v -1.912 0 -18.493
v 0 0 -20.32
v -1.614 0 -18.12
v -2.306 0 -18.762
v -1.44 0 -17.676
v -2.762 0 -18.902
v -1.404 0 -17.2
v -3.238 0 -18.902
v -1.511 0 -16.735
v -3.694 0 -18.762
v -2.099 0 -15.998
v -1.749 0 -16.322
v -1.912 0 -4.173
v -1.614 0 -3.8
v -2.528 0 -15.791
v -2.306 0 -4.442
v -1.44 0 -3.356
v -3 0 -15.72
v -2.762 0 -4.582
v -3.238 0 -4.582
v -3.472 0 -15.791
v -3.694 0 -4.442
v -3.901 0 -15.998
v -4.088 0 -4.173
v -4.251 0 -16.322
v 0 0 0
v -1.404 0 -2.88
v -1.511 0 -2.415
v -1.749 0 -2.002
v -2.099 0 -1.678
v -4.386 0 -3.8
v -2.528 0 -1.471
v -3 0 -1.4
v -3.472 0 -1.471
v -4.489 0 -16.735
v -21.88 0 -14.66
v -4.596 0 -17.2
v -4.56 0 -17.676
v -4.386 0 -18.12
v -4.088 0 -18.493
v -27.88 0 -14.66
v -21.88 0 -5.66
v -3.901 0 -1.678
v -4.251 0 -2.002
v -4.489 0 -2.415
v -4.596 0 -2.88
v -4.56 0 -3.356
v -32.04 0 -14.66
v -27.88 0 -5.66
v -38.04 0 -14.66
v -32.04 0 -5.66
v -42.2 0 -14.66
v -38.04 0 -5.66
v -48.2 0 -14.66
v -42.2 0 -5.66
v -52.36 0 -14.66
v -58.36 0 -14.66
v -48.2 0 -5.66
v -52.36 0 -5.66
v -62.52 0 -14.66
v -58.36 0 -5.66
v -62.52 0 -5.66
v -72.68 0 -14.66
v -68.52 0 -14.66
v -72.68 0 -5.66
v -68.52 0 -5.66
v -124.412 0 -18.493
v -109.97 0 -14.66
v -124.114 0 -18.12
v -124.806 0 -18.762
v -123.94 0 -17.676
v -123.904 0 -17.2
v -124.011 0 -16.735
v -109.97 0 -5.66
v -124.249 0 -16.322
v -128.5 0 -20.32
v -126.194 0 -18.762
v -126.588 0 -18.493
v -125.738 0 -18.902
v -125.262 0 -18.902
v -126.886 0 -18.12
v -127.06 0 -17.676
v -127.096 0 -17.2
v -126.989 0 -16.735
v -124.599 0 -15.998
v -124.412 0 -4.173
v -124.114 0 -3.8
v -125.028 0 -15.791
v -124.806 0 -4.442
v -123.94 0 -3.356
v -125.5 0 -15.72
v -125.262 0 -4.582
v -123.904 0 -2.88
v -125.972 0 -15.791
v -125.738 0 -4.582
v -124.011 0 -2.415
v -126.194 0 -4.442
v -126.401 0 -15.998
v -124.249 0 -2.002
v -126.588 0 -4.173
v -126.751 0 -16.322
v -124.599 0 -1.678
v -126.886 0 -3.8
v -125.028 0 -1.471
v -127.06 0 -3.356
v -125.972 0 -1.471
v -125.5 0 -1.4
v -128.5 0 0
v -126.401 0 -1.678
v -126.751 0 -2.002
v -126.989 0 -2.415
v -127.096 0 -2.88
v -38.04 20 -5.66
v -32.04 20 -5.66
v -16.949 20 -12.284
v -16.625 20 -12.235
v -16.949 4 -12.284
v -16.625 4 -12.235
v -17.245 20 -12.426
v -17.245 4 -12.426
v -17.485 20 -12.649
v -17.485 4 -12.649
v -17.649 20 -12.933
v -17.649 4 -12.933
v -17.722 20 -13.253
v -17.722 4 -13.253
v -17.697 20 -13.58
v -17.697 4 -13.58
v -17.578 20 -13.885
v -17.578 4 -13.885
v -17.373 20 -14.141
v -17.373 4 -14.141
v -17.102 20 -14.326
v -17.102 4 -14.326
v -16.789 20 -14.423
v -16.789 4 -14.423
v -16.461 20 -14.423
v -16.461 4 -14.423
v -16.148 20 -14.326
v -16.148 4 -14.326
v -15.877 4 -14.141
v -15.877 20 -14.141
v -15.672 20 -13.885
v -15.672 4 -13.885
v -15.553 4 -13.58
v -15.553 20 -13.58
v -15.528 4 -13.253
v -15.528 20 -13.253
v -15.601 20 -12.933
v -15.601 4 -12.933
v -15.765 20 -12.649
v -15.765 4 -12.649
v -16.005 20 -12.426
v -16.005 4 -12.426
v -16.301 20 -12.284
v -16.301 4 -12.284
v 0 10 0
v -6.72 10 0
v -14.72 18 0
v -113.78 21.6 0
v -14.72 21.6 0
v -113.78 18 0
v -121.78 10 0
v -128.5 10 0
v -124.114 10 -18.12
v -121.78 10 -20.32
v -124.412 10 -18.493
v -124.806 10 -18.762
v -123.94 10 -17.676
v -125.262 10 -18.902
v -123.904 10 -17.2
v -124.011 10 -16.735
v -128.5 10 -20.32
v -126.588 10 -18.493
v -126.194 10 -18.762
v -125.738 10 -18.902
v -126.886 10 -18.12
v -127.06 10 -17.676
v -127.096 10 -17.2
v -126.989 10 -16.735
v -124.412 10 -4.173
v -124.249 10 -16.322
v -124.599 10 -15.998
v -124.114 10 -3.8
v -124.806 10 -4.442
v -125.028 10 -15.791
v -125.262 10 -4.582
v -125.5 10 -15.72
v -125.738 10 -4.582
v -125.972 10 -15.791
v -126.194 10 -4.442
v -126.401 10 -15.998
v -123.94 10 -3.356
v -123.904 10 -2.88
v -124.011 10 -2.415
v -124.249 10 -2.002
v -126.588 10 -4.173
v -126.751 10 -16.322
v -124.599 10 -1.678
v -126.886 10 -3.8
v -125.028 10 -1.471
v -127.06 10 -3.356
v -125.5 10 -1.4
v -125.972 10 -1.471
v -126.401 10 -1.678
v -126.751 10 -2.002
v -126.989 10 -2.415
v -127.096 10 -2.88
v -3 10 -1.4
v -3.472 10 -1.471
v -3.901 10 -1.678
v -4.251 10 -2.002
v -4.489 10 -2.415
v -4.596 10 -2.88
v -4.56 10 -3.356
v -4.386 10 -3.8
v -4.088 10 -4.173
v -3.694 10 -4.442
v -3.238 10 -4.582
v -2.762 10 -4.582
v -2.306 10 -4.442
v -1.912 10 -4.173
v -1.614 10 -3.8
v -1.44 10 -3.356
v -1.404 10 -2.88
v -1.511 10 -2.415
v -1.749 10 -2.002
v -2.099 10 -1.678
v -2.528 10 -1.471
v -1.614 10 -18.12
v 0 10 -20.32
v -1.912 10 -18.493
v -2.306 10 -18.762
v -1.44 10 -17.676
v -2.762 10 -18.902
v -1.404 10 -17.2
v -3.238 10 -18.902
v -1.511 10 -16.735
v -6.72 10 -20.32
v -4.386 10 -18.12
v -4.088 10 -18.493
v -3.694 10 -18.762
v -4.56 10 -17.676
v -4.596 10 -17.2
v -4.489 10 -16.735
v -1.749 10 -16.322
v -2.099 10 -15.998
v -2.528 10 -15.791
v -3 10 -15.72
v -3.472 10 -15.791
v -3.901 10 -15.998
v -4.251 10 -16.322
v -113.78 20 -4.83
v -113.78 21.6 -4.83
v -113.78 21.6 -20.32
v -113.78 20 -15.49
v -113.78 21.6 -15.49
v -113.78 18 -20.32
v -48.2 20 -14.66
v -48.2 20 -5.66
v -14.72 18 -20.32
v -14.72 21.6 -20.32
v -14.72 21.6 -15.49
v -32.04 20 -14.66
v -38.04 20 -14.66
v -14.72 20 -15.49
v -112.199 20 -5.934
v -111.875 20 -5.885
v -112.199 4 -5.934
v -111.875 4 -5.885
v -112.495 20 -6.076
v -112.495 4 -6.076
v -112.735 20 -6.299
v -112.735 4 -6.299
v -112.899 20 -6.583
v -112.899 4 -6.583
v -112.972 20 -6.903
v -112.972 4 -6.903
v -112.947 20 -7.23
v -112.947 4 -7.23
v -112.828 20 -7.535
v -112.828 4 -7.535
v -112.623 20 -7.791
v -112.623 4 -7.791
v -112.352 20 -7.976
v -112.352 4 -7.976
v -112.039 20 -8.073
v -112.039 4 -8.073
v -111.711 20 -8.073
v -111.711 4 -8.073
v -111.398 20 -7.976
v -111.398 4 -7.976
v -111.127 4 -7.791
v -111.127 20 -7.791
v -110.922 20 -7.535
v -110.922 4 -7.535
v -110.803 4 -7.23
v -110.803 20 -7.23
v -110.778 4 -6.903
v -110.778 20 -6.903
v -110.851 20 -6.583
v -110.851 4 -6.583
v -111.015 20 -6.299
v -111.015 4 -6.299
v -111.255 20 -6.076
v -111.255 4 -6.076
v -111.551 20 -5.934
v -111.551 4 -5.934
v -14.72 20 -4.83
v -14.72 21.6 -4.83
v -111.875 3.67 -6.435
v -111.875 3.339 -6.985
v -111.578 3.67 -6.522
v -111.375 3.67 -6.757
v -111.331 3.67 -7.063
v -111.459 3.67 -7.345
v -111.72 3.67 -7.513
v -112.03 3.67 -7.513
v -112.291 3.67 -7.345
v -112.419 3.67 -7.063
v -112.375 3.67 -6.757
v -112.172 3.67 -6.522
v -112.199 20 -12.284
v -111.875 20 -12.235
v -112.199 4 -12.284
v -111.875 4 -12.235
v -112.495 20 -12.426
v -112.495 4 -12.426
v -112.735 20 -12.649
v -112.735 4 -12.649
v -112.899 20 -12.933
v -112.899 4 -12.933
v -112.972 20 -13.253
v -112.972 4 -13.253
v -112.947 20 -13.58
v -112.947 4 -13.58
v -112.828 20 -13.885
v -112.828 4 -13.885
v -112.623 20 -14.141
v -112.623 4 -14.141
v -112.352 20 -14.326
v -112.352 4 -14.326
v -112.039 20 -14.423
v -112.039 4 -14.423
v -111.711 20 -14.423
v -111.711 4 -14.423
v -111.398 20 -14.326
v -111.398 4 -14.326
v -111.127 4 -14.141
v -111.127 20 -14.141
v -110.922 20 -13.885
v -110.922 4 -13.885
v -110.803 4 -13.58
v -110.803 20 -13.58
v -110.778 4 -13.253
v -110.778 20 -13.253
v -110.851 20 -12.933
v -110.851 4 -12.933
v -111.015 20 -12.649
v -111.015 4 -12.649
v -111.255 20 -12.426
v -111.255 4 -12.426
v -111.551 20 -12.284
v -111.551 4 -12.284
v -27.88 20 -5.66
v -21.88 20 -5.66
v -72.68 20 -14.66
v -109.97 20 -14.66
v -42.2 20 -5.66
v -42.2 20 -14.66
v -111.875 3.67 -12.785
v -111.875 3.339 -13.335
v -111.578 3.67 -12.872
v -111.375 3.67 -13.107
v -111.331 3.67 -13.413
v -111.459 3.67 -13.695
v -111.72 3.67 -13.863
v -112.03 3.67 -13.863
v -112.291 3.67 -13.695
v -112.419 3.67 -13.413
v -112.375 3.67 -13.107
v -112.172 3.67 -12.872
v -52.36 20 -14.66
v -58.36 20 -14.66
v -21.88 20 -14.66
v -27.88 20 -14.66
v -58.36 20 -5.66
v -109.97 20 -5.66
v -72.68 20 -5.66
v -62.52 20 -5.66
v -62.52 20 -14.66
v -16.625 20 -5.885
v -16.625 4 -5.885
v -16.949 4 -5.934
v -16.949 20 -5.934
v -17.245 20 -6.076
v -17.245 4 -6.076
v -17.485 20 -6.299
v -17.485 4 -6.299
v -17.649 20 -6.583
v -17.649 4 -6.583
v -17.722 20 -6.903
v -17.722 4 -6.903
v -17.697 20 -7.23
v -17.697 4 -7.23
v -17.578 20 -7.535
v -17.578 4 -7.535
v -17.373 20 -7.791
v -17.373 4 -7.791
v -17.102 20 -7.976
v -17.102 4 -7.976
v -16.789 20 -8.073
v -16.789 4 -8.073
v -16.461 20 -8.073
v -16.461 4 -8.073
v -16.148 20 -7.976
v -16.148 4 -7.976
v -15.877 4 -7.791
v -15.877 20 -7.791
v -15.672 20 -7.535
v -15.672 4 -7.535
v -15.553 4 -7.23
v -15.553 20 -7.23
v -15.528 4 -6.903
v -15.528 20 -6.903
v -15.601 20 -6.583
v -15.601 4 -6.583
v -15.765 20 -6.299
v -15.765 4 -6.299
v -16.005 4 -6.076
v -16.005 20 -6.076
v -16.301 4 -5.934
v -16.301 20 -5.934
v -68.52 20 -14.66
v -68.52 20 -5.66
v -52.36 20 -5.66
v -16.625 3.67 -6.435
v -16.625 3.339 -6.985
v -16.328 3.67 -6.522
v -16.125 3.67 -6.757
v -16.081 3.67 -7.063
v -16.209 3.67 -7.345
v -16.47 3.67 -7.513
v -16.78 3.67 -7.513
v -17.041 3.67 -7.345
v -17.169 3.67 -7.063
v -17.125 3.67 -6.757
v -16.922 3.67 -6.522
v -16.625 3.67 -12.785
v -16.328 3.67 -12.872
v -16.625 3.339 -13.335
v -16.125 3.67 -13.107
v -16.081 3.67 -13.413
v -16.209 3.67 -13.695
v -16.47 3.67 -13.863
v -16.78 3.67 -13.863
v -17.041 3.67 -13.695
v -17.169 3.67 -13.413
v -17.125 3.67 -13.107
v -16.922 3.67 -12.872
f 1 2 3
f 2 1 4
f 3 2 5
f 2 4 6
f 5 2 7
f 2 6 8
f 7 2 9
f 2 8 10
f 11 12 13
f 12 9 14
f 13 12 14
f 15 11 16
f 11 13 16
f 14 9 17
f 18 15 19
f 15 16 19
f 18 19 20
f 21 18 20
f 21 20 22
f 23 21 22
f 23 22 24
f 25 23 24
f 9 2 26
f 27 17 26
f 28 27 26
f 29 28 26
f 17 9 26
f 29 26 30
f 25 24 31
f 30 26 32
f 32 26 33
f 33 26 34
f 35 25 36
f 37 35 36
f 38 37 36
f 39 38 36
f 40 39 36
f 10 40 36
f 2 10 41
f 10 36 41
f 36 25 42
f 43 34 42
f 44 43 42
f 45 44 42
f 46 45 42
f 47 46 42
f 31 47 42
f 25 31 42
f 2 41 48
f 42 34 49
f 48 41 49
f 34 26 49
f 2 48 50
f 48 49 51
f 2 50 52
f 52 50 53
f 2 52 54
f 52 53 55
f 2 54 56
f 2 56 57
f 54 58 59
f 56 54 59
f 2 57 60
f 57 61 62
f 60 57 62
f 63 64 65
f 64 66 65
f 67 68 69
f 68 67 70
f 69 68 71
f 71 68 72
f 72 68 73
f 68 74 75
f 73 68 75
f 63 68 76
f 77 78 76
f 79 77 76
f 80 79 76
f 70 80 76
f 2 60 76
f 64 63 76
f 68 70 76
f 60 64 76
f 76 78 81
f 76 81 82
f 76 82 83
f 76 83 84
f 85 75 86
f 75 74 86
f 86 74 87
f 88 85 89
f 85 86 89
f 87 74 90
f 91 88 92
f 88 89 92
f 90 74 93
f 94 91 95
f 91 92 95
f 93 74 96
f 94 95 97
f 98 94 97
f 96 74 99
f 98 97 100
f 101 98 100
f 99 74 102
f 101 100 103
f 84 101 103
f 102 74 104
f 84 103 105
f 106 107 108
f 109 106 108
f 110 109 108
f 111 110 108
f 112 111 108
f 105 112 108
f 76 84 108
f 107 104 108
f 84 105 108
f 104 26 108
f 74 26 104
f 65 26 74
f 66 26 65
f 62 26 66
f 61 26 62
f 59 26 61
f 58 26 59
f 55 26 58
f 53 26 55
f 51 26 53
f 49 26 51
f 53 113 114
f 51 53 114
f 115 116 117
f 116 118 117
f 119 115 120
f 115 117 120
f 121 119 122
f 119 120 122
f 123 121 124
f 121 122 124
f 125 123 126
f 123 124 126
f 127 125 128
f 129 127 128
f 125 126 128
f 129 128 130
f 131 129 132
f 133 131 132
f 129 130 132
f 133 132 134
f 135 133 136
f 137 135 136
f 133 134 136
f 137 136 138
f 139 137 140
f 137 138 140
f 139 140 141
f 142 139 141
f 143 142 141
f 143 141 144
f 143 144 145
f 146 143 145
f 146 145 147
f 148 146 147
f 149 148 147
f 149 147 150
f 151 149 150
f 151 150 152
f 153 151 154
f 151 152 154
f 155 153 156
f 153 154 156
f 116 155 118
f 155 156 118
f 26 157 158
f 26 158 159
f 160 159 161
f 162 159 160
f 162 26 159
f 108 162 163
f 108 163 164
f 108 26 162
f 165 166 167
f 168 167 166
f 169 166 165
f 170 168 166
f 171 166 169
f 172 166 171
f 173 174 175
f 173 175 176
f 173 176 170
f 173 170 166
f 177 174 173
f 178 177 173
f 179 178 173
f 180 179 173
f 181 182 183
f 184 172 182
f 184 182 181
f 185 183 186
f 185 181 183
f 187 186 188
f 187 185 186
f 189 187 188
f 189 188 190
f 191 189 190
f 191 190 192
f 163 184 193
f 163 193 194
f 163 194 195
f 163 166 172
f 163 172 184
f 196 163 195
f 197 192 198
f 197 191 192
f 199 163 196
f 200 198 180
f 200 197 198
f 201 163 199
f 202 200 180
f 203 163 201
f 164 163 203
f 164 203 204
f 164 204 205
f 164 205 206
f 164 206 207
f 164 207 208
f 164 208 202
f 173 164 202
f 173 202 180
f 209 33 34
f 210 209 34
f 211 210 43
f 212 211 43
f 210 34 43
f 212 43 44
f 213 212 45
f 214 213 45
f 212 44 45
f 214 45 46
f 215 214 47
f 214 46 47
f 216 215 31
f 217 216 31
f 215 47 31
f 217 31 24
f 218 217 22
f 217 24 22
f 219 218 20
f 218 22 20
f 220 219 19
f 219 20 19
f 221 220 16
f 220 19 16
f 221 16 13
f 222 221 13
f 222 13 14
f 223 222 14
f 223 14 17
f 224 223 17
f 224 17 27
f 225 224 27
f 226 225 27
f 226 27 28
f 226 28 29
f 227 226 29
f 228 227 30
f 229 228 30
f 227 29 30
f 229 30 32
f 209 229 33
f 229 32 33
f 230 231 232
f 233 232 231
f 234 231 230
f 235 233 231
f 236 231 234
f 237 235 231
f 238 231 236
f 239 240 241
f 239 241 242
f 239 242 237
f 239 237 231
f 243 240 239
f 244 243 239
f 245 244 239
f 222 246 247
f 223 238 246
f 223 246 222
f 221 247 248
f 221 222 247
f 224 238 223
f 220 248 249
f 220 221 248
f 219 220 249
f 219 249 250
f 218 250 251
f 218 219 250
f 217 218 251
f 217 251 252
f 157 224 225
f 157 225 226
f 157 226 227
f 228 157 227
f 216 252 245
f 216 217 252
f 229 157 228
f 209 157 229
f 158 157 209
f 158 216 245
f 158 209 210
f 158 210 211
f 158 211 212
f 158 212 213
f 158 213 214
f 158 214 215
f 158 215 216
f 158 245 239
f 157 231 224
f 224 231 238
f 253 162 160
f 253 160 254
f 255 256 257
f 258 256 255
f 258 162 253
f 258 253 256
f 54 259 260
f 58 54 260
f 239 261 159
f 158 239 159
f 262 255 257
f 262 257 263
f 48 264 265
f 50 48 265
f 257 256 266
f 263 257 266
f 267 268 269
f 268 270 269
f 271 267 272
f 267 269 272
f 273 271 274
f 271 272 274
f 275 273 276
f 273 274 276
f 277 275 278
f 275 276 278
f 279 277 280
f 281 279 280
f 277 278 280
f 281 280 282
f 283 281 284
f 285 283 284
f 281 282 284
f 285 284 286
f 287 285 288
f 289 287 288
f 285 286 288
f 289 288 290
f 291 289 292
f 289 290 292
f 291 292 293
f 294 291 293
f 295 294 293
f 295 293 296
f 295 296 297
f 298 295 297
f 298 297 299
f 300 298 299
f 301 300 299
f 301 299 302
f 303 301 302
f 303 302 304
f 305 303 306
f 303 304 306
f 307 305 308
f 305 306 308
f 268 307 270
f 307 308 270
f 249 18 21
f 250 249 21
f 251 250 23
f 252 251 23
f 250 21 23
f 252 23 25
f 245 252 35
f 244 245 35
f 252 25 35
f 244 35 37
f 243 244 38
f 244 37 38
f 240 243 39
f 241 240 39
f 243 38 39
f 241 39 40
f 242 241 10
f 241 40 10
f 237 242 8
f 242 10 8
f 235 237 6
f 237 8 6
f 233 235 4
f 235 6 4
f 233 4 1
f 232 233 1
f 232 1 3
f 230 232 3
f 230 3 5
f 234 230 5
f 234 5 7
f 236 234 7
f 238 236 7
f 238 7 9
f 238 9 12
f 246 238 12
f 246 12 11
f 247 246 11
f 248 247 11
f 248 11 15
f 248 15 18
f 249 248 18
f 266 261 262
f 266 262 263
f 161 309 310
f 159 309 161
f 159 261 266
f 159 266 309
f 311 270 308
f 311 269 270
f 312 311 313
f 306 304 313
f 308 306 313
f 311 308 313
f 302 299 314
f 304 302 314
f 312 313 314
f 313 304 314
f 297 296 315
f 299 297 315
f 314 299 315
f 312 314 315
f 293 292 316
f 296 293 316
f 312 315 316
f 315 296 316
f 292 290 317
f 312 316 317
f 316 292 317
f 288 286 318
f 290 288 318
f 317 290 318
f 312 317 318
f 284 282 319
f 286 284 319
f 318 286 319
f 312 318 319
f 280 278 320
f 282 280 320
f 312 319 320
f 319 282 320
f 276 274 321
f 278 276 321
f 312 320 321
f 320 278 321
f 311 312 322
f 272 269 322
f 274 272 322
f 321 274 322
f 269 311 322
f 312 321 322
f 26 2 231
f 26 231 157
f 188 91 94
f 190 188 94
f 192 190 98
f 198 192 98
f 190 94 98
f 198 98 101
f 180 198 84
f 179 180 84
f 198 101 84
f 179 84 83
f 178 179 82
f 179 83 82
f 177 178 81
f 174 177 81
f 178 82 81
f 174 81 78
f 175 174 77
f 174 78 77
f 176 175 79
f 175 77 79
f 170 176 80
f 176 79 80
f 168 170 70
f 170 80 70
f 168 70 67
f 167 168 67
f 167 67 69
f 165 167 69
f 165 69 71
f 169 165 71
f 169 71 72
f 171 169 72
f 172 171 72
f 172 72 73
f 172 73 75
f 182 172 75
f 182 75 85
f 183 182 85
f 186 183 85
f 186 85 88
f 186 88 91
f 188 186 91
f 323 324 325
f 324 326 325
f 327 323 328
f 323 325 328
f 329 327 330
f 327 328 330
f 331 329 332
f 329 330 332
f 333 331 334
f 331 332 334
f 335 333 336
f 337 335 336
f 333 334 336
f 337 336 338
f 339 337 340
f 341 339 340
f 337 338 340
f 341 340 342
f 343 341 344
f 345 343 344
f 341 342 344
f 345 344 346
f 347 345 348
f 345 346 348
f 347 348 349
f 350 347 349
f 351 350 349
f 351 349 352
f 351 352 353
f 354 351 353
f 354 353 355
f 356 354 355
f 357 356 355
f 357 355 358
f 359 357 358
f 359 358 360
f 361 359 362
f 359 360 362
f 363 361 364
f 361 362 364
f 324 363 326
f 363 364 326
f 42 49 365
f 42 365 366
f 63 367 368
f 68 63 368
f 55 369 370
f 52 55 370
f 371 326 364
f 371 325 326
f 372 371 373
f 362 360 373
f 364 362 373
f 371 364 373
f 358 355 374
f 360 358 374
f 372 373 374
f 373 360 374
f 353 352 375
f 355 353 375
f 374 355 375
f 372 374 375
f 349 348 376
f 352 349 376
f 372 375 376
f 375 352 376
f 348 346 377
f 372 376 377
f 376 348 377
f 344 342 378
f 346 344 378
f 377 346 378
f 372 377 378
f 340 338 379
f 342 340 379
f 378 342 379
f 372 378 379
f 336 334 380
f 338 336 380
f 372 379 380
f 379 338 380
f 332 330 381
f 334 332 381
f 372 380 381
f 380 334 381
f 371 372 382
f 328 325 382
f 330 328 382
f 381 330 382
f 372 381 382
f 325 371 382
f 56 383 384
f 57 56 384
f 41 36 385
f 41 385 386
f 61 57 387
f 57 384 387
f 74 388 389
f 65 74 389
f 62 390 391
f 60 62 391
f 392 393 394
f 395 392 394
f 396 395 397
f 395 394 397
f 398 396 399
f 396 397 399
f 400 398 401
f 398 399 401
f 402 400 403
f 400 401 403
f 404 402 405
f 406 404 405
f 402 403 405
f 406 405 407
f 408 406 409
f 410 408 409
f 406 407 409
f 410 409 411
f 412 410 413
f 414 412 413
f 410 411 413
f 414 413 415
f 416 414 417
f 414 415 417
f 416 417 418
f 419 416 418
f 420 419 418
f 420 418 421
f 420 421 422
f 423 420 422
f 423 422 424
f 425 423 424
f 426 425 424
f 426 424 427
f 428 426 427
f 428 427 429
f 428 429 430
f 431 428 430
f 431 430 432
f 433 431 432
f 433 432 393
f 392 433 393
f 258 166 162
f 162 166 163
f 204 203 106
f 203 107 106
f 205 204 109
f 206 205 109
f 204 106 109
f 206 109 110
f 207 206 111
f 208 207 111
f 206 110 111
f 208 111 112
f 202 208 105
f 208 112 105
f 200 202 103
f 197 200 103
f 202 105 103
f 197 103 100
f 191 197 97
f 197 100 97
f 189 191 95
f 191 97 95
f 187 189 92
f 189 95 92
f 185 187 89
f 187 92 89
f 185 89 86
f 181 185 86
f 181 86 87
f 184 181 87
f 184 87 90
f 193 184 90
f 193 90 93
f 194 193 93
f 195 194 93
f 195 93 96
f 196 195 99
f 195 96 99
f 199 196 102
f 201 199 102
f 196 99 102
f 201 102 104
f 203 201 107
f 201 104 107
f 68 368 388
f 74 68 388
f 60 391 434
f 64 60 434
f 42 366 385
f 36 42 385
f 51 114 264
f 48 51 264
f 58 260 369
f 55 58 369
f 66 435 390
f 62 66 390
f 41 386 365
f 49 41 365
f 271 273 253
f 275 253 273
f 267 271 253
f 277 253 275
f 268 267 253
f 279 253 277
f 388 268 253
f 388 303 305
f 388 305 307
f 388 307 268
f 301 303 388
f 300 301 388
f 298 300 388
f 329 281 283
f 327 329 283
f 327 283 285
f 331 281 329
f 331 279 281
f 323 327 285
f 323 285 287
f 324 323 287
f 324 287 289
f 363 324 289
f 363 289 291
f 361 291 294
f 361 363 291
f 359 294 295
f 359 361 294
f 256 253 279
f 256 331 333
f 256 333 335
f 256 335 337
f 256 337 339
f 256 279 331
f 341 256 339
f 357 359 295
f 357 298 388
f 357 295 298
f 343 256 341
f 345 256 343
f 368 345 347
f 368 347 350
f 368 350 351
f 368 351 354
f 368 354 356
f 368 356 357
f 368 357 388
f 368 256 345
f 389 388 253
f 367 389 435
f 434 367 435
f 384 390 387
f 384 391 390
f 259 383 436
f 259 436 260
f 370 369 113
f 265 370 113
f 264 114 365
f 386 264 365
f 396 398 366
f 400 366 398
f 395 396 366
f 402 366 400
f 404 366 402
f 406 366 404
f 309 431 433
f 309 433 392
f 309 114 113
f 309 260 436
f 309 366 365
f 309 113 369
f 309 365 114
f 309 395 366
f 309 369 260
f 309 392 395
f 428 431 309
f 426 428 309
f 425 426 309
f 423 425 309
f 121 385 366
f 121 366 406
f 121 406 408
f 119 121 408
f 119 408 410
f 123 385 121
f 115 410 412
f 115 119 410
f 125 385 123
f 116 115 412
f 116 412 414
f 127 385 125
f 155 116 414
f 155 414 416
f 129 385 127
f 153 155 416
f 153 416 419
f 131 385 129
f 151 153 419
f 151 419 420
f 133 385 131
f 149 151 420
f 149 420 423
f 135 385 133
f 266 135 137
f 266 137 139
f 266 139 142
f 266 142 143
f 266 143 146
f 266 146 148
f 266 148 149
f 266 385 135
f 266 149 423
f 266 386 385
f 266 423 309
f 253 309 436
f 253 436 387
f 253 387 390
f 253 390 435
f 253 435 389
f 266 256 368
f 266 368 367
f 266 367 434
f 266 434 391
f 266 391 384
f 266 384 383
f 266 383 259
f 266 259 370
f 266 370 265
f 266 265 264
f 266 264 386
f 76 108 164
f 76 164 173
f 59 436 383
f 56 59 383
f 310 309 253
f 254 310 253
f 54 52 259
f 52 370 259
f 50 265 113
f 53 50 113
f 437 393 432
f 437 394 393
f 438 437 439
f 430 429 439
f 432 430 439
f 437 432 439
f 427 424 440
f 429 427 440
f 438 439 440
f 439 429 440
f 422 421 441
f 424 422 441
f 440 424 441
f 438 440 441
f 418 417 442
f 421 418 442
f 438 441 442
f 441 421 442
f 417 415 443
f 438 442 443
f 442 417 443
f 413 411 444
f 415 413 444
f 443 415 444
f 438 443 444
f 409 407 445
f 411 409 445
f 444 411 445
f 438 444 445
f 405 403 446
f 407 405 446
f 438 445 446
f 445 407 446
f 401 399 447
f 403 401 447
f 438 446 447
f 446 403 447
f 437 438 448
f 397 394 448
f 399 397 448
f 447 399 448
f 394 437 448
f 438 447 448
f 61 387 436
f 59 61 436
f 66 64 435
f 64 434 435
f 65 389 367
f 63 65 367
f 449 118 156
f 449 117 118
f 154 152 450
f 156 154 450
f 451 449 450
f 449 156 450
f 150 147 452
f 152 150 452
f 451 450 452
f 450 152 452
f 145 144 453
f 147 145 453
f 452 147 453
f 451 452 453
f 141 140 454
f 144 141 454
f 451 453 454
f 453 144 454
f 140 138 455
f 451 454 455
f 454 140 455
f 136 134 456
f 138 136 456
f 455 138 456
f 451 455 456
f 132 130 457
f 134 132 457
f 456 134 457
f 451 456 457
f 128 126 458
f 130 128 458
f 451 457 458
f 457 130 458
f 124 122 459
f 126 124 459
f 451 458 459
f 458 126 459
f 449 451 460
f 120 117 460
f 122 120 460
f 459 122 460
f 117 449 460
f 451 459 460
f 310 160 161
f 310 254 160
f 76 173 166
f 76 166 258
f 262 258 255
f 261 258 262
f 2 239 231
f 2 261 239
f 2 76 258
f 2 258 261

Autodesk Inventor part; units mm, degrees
ref_plane "YZ Plane" through (0, 0, 0) normal (1, 0, 0) x (0, 1, 0)
ref_plane "XZ Plane" through (0, 0, 0) normal (0, 1, 0) x (-1, 0, 0)
ref_plane "XY Plane" through (0, 0, 0) normal (0, 0, 1) x (1, 0, 0)
sketch "Sketch1" plane through (0, 0, 0) normal (0, 1, 0) x (-1, 0, 0)
  line L0 (0, 0) -> (128.5, 0)
  line L1 (128.5, 0) -> (128.5, -20.32)
  line L2 (128.5, -20.32) -> (0, -20.32)
  line L3 (0, -20.32) -> (0, 0)
  dimension "d0" = 20.32
  dimension "d1" = 128.5
extrude "Extrusion1" add sketch "Sketch1" along normal blind 10
sketch "Sketch2" plane through (0, 10, 0) normal (0, 1, 0) x (1, 0, 0)
  line L0 (-128.5, 0) -> (0, 0) projected
  line L1 (0, 0) -> (0, 20.32) projected
  line L2 (0, 20.32) -> (-128.5, 20.32) projected
  line L3 (-128.5, 20.32) -> (-128.5, 0) projected
  line L4 (-128.5, 0) -> (0, 0) projected
  line L5 (0, 20.32) -> (-128.5, 20.32) projected
  line L6 (-14.72, 0) -> (-113.78, 0)
  line L7 (-113.78, 0) -> (-113.78, 20.32)
  line L8 (-113.78, 20.32) -> (-14.72, 20.32)
  line L9 (-14.72, 20.32) -> (-14.72, 0)
  line L10 (-128.5, 20.32) -> (-113.78, 20.32)
  line L11 (-128.5, 20.32) -> (0, 20.32) projected
  line L12 (-14.72, 20.32) -> (0, 20.32)
  line L13 (-128.5, 10.16) -> (-113.78, 10.16)
  line L14 (-14.72, 10.16) -> (0, 10.16)
  dimension "d19" = 99.06
extrude "Extrusion2" add sketch "Sketch2" along normal blind 10 contours L7 L2 L9 L0
sketch "Sketch3" plane through (0, 10, 0) normal (0, 1, 0) x (1, 0, 0)
  line L0 (-113.78, 0) -> (-113.78, 20.32) projected
  line L1 (-113.78, 20.32) -> (-128.5, 20.32) projected
  line L2 (-128.5, 20.32) -> (-128.5, 0) projected
  line L3 (-128.5, 0) -> (-113.78, 0) projected
  line L4 (-14.72, 20.32) -> (-14.72, 0) projected
  line L5 (-14.72, 0) -> (0, 0) projected
  line L6 (0, 0) -> (0, 20.32) projected
  line L7 (0, 20.32) -> (-14.72, 20.32) projected
  line L8 (-113.78, 20.32) -> (-128.5, 20.32) projected
  line L9 (-128.5, 0) -> (-125.5, 0)
  line L10 (-125.5, 0) -> (-125.5, 20.32)
  line L11 (-125.5, 20.32) -> (-128.5, 20.32)
  line L12 (-128.5, 20.32) -> (-128.5, 0)
  line L13 (-128.5, 20.32) -> (0, 20.32) projected
  line L14 (0, 0) -> (-3, 0)
  line L15 (-3, 0) -> (-3, 20.32)
  line L16 (-3, 20.32) -> (0, 20.32)
  line L17 (0, 20.32) -> (0, 0)
  line L18 (-125.5, 0) -> (-3, 0)
  line L19 (-3, 0) -> (-3, 3)
  line L20 (-3, 3) -> (-125.5, 3)
  line L21 (-125.5, 3) -> (-125.5, 0)
  line L22 (-125.5, 20.32) -> (-3, 20.32)
  line L23 (-3, 20.32) -> (-3, 17.32)
  line L24 (-3, 17.32) -> (-125.5, 17.32)
  line L25 (-125.5, 17.32) -> (-125.5, 20.32)
  dimension "d8" = 3
  dimension "d9" = 3
  dimension "d10" = 3
  dimension "d11" = 3
hole "Hole1" at (-125.5, 10, -3) at (-125.5, 10, -17.32) at (-3, 10, -17.32) at (-3, 10, -3) direction (0, -1, 0) diameter 3.2 end through all
sketch "Sketch4" plane through (0, 20, 0) normal (0, 1, 0) x (1, 0, 0)
  line L0 (-14.72, 20.32) -> (-14.72, 0) projected
  line L1 (-14.72, 10.16) -> (-113.78, 10.16)
  line L2 (-113.78, 20.32) -> (-113.78, 0) projected
  line L3 (-27.88, 5.66) -> (-21.88, 5.66)
  line L4 (-21.88, 5.66) -> (-21.88, 14.66)
  line L5 (-21.88, 14.66) -> (-27.88, 14.66)
  line L6 (-27.88, 14.66) -> (-27.88, 5.66)
  line L7 (-27.88, 5.66) -> (-21.88, 14.66) construction
  line L8 (-21.88, 5.66) -> (-27.88, 14.66) construction
  line L9 (-38.04, 5.66) -> (-32.04, 5.66)
  line L10 (-32.04, 5.66) -> (-32.04, 14.66)
  line L11 (-32.04, 14.66) -> (-38.04, 14.66)
  line L12 (-38.04, 14.66) -> (-38.04, 5.66)
  line L13 (-38.04, 5.66) -> (-32.04, 14.66) construction
  line L14 (-32.04, 5.66) -> (-38.04, 14.66) construction
  line L15 (-48.2, 5.66) -> (-42.2, 5.66)
  line L16 (-42.2, 5.66) -> (-42.2, 14.66)
  line L17 (-42.2, 14.66) -> (-48.2, 14.66)
  line L18 (-48.2, 14.66) -> (-48.2, 5.66)
  line L19 (-48.2, 5.66) -> (-42.2, 14.66) construction
  line L20 (-42.2, 5.66) -> (-48.2, 14.66) construction
  line L21 (-58.36, 5.66) -> (-52.36, 5.66)
  line L22 (-52.36, 5.66) -> (-52.36, 14.66)
  line L23 (-52.36, 14.66) -> (-58.36, 14.66)
  line L24 (-58.36, 14.66) -> (-58.36, 5.66)
  line L25 (-58.36, 5.66) -> (-52.36, 14.66) construction
  line L26 (-52.36, 5.66) -> (-58.36, 14.66) construction
  line L27 (-68.52, 5.66) -> (-62.52, 5.66)
  line L28 (-62.52, 5.66) -> (-62.52, 14.66)
  line L29 (-62.52, 14.66) -> (-68.52, 14.66)
  line L30 (-68.52, 14.66) -> (-68.52, 5.66)
  line L31 (-68.52, 5.66) -> (-62.52, 14.66) construction
  line L32 (-62.52, 5.66) -> (-68.52, 14.66) construction
  line L33 (-78.68, 5.66) -> (-72.68, 5.66)
  line L34 (-72.68, 5.66) -> (-72.68, 14.66)
  line L35 (-72.68, 14.66) -> (-78.68, 14.66)
  line L36 (-78.68, 14.66) -> (-78.68, 5.66)
  line L37 (-78.68, 5.66) -> (-72.68, 14.66) construction
  line L38 (-72.68, 5.66) -> (-78.68, 14.66) construction
  line L39 (-72.68, 14.66) -> (-109.97, 14.66)
  line L40 (-109.97, 14.66) -> (-109.97, 5.66)
  line L41 (-109.97, 5.66) -> (-72.68, 5.66)
  line L42 (-72.68, 5.66) -> (-72.68, 14.66)
  point P0 (-24.88, 10.16)
  point P1 (-35.04, 10.16)
  point P2 (-45.2, 10.16)
  point P3 (-55.36, 10.16)
  point P4 (-65.52, 10.16)
  point P5 (-75.68, 10.16)
  dimension "d22" = 6
  dimension "d23" = 9
  dimension "d24" = 10.16
  dimension "d25" = 6
  dimension "d26" = 9
  dimension "d27" = 10.16
  dimension "d28" = 6
  dimension "d29" = 9
  dimension "d30" = 6
  dimension "d31" = 9
  dimension "d32" = 6
  dimension "d33" = 9
  dimension "d34" = 6
  dimension "d35" = 9
  dimension "d36" = 10.16
  dimension "d37" = 10.16
  dimension "d38" = 10.16
  dimension "d39" = 10.16
  dimension "d41" = 3.81
extrude "Extrusion3" cut sketch "Sketch4" against normal through all
sketch "Sketch5" plane through (0, 20, 0) normal (0, 1, 0) x (1, 0, 0)
  line L0 (-14.72, 0) -> (-14.72, 20.32) projected
  line L1 (-113.78, 20.32) -> (-113.78, 0) projected
  line L2 (-14.72, 0) -> (-113.78, 20.32)
  line L3 (-113.78, 0) -> (-14.72, 20.32)
  line L4 (-111.875, 13.335) -> (-111.875, 6.985)
  line L5 (-111.875, 6.985) -> (-16.625, 6.985)
  line L6 (-16.625, 6.985) -> (-16.625, 13.335)
  line L7 (-16.625, 13.335) -> (-111.875, 13.335)
  line L8 (-111.875, 13.335) -> (-16.625, 6.985) construction
  line L9 (-111.875, 6.985) -> (-16.625, 13.335) construction
  point P0 (0, 0)
  point P1 (-64.25, 10.16)
  dimension "d44" = 95.25
  dimension "d45" = 6.35
hole "Hole2" at (-16.625, 20, -13.335) at (-16.625, 20, -6.985) at (-111.875, 20, -13.335) at (-111.875, 20, -6.985) direction (0, -1, 0) diameter 2.2 depth 16 tip angle 118
chamfer "Chamfer1" distance 8 angle 45 2 edges at (-14.72, 10, -10.16) (-113.78, 10, -10.16)
sketch "Sketch6" plane through (0, 20, 0) normal (0, 1, 0) x (1, 0, 0)
  line L0 (-14.72, 0) -> (-14.72, 20.32) projected
  line L1 (-113.78, 20.32) -> (-121.78, 20.32) projected
  line L2 (-14.72, 20.32) -> (-113.78, 20.32)
  line L3 (-113.78, 20.32) -> (-113.78, 15.49)
  line L4 (-113.78, 15.49) -> (-14.72, 15.49)
  line L5 (-14.72, 15.49) -> (-14.72, 20.32)
  line L6 (-113.78, 0) -> (-14.72, 0)
  line L7 (-14.72, 0) -> (-14.72, 4.83)
  line L8 (-14.72, 4.83) -> (-113.78, 4.83)
  line L9 (-113.78, 4.83) -> (-113.78, 0)
  point P0 (0, 0)
  dimension "d56" = 10.66
extrude "Extrusion4" add sketch "Sketch6" along normal blind 1.6
properties part number "OttosDIY_Testing"
